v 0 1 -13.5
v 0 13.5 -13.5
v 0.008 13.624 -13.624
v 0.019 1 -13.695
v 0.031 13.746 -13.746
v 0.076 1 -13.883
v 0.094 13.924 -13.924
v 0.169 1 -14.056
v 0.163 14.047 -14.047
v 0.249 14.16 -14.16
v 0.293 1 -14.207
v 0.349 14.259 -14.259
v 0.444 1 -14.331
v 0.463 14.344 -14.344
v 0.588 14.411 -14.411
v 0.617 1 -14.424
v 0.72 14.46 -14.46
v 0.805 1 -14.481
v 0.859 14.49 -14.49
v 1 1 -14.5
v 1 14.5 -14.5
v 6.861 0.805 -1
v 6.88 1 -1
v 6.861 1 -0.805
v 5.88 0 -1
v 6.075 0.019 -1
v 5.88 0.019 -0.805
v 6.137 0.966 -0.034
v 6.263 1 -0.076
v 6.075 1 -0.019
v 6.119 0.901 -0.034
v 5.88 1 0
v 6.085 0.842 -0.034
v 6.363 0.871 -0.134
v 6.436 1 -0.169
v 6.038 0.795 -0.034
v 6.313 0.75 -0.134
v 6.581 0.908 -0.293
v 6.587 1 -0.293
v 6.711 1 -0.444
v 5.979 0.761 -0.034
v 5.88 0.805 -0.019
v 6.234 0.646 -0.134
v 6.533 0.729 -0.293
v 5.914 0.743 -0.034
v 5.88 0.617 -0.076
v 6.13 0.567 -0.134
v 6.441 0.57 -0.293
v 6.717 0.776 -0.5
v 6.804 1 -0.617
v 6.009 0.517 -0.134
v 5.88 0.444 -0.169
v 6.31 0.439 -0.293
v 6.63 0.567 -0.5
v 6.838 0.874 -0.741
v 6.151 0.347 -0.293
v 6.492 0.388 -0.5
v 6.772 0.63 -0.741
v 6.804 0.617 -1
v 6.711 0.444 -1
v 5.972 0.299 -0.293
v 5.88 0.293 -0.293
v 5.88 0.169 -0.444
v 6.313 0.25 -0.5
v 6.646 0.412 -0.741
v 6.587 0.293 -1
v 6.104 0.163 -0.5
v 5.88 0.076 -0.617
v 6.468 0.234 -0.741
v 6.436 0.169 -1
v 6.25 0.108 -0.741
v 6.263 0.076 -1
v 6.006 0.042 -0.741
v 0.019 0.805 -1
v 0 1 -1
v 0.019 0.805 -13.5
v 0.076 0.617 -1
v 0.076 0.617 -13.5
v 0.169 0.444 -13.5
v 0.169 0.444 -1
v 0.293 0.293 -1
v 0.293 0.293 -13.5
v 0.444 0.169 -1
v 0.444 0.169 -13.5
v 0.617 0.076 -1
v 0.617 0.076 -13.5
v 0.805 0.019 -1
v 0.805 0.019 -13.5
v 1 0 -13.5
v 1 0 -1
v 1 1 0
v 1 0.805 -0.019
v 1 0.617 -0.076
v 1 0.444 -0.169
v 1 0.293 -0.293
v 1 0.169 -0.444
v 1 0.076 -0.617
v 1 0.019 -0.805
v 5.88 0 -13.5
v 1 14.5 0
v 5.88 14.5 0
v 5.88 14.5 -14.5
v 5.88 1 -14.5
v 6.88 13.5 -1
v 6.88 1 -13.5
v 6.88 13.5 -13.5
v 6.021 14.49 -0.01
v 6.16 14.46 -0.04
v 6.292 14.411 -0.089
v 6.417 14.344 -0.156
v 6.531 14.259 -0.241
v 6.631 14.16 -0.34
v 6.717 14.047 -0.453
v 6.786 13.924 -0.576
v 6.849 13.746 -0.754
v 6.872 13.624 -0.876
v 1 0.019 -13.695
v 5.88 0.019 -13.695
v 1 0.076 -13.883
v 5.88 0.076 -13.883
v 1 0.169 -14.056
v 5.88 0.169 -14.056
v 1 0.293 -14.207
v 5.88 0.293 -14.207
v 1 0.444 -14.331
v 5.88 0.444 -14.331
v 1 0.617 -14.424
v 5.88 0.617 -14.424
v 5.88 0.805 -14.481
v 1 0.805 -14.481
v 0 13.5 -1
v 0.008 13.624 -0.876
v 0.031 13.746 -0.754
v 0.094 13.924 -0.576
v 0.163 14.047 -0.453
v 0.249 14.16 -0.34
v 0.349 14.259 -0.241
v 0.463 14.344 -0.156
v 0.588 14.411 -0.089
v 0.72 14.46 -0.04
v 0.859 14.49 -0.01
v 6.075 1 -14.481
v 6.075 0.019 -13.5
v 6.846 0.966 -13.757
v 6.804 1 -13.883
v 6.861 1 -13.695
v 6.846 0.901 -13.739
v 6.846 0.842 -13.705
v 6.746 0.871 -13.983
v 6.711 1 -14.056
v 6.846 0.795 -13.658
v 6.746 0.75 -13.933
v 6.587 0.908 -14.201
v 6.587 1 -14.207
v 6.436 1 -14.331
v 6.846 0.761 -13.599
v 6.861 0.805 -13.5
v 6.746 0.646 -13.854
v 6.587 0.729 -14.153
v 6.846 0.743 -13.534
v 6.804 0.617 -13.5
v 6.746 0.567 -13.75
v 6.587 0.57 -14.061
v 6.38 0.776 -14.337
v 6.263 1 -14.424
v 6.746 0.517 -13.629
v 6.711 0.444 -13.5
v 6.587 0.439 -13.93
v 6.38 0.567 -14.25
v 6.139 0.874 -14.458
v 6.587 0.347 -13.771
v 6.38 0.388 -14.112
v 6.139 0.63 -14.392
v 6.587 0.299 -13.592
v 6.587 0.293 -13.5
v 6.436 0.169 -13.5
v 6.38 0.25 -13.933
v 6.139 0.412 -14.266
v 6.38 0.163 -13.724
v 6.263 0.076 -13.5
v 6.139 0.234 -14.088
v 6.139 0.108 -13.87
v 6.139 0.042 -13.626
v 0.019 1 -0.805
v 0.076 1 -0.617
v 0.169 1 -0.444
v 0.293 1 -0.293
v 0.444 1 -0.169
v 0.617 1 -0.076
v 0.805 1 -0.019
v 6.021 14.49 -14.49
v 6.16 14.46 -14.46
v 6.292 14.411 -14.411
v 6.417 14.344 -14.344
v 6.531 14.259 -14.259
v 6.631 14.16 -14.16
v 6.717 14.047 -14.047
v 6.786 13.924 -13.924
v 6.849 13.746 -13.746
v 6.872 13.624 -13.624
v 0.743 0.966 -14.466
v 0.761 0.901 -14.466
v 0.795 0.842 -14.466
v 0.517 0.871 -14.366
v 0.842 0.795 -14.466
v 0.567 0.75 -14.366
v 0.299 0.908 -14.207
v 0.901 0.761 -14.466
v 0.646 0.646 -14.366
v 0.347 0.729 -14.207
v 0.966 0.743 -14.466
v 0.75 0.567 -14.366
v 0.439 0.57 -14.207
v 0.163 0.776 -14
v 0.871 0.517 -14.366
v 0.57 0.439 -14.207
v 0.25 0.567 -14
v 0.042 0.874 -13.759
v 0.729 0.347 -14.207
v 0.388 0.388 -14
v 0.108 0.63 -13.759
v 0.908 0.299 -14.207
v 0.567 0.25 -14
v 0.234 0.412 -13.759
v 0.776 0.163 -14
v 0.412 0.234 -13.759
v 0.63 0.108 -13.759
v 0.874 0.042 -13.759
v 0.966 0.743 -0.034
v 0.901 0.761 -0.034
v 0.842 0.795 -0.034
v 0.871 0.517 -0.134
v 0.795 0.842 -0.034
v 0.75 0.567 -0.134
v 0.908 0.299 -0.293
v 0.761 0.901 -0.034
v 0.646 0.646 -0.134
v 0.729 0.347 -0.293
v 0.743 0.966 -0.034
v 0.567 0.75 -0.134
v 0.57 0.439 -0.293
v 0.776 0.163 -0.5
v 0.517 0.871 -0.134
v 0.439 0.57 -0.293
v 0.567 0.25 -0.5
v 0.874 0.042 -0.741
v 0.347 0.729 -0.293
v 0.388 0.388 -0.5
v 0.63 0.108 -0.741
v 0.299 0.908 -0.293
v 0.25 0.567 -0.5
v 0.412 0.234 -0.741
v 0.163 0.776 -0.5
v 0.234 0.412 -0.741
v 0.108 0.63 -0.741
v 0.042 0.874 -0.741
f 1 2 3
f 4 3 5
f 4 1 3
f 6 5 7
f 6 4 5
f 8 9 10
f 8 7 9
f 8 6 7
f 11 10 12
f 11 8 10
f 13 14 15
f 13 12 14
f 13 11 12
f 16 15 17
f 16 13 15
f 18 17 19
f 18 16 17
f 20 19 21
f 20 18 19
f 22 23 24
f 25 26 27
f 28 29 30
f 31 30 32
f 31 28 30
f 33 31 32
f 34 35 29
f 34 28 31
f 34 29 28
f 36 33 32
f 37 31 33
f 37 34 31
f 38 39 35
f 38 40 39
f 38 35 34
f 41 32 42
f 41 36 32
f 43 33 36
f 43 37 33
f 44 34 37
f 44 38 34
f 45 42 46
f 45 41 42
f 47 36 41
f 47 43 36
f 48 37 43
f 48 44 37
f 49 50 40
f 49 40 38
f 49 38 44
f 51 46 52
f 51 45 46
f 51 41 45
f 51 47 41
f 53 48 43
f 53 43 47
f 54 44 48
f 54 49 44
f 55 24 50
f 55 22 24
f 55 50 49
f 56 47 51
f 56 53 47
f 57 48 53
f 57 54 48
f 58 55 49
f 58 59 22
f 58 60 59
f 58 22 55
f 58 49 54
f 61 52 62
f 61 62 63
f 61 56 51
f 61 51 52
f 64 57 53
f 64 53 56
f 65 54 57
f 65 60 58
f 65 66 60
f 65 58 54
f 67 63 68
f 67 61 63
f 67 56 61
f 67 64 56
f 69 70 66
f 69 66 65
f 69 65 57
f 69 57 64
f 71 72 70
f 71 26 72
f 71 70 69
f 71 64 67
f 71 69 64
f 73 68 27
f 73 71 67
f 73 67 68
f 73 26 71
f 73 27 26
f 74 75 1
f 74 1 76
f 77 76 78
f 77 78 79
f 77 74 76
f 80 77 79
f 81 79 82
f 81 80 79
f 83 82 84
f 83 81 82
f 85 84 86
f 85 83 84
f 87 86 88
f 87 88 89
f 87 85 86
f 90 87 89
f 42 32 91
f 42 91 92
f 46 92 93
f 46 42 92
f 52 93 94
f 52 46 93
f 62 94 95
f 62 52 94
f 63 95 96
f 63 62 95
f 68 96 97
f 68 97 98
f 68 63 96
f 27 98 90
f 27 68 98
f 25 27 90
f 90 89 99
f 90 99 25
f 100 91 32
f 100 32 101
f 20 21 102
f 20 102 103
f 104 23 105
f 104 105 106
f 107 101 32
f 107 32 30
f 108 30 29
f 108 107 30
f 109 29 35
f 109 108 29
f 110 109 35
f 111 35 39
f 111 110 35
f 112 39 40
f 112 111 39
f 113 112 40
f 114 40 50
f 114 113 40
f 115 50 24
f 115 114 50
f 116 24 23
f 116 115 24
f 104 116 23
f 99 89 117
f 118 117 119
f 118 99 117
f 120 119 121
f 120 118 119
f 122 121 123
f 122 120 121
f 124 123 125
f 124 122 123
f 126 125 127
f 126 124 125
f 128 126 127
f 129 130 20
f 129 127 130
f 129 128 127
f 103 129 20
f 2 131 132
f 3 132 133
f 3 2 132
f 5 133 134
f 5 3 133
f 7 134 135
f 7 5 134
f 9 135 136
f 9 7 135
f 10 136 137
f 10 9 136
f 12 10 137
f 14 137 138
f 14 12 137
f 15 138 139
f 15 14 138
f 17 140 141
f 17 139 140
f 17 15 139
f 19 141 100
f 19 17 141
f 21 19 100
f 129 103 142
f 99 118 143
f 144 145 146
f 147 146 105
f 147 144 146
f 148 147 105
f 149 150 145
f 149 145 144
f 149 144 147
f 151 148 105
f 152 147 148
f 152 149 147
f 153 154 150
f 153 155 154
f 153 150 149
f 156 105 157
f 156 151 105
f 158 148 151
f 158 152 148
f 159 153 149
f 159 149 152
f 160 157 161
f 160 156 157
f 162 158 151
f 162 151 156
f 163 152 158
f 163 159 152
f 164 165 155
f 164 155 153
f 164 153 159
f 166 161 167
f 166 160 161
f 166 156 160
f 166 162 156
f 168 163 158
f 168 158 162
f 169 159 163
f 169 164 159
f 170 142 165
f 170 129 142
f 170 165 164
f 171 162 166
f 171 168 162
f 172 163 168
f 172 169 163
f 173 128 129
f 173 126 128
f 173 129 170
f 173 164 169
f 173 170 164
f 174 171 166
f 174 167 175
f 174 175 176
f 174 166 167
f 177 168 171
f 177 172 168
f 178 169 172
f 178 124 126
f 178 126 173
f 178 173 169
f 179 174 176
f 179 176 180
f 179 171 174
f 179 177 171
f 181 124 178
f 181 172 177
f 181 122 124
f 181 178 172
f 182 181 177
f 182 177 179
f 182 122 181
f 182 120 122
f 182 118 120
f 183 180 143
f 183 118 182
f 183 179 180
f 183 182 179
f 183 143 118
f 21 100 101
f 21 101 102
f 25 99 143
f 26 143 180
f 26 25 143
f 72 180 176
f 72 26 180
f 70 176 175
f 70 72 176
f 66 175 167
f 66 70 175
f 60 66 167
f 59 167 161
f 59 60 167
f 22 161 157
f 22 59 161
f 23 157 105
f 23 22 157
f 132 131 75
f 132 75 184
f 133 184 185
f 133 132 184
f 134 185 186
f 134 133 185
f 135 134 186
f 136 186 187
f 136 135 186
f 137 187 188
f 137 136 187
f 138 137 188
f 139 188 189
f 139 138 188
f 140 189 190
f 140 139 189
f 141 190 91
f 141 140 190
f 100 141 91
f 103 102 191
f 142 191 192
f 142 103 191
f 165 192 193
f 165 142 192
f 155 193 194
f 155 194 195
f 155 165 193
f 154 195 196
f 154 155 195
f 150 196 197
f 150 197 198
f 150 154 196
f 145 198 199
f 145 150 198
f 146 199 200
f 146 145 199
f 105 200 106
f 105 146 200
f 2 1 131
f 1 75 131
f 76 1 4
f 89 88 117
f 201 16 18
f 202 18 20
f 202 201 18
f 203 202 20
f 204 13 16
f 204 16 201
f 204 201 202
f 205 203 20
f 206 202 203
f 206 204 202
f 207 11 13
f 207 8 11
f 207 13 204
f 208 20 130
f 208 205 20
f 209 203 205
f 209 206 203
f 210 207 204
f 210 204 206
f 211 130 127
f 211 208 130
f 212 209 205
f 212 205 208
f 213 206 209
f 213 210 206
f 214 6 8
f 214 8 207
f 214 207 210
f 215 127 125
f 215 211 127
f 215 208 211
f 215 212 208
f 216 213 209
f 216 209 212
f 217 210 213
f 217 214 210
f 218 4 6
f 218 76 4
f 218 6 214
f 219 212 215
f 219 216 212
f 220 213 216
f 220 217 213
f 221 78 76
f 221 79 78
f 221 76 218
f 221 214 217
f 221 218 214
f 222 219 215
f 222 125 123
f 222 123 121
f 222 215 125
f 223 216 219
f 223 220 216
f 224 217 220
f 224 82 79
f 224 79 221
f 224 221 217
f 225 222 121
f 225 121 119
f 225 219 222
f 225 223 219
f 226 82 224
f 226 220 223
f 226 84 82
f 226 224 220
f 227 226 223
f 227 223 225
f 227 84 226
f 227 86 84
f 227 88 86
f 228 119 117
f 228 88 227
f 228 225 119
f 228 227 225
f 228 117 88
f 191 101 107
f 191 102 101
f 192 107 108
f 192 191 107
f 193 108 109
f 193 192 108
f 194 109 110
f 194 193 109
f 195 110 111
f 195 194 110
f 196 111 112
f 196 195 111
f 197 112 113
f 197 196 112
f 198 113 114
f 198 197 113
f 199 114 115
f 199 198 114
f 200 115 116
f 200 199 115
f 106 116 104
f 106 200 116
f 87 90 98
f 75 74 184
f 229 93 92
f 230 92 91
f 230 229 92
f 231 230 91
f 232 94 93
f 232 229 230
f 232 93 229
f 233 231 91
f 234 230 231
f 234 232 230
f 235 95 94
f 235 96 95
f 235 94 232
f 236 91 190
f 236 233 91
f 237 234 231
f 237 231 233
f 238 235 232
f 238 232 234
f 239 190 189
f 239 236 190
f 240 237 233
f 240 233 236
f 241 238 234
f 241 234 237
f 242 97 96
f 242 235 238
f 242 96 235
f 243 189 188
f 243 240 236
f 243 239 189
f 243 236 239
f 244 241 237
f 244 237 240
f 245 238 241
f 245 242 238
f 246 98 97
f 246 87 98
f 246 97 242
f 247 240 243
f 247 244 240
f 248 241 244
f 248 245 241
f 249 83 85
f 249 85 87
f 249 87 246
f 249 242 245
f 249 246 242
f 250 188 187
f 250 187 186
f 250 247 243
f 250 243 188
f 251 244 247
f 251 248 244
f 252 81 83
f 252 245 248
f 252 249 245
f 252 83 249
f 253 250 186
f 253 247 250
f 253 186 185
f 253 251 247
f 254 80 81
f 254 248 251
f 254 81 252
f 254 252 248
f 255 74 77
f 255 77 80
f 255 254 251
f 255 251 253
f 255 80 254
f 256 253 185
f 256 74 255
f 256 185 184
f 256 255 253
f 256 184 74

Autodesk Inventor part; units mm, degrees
ref_plane "YZ Plane" through (0, 0, 0) normal (1, 0, 0) x (0, 1, 0)
ref_plane "XZ Plane" through (0, 0, 0) normal (0, 1, 0) x (-1, 0, 0)
ref_plane "XY Plane" through (0, 0, 0) normal (0, 0, 1) x (1, 0, 0)
sketch "Sketch1" plane through (0, 0, 0) normal (1, 0, 0) x (0, 1, 0)
  line L0 (0, 0) -> (14.5, 0)
  line L1 (14.5, 0) -> (14.5, -14.5)
  line L2 (14.5, -14.5) -> (0, -14.5)
  line L3 (0, -14.5) -> (0, 0)
  dimension "d5" = 14.5
  dimension "d6" = 14.5
extrude "Extrusion1" add sketch "Sketch1" along normal blind 6.88
fillet "Fillet1" radius 1 10 edges at (0, 0, -7.25) (0, 7.25, -14.5) (3.44, 0, -14.5) (6.88, 7.25, -14.5) (6.88, 0, -7.25) (6.88, 7.25, 0) (0, 7.25, 0) (3.44, 0, 0) (0, 14.5, -7.25) (6.88, 14.5, -7.25)
properties part number "battery_1S_100mAh_no_prot"
